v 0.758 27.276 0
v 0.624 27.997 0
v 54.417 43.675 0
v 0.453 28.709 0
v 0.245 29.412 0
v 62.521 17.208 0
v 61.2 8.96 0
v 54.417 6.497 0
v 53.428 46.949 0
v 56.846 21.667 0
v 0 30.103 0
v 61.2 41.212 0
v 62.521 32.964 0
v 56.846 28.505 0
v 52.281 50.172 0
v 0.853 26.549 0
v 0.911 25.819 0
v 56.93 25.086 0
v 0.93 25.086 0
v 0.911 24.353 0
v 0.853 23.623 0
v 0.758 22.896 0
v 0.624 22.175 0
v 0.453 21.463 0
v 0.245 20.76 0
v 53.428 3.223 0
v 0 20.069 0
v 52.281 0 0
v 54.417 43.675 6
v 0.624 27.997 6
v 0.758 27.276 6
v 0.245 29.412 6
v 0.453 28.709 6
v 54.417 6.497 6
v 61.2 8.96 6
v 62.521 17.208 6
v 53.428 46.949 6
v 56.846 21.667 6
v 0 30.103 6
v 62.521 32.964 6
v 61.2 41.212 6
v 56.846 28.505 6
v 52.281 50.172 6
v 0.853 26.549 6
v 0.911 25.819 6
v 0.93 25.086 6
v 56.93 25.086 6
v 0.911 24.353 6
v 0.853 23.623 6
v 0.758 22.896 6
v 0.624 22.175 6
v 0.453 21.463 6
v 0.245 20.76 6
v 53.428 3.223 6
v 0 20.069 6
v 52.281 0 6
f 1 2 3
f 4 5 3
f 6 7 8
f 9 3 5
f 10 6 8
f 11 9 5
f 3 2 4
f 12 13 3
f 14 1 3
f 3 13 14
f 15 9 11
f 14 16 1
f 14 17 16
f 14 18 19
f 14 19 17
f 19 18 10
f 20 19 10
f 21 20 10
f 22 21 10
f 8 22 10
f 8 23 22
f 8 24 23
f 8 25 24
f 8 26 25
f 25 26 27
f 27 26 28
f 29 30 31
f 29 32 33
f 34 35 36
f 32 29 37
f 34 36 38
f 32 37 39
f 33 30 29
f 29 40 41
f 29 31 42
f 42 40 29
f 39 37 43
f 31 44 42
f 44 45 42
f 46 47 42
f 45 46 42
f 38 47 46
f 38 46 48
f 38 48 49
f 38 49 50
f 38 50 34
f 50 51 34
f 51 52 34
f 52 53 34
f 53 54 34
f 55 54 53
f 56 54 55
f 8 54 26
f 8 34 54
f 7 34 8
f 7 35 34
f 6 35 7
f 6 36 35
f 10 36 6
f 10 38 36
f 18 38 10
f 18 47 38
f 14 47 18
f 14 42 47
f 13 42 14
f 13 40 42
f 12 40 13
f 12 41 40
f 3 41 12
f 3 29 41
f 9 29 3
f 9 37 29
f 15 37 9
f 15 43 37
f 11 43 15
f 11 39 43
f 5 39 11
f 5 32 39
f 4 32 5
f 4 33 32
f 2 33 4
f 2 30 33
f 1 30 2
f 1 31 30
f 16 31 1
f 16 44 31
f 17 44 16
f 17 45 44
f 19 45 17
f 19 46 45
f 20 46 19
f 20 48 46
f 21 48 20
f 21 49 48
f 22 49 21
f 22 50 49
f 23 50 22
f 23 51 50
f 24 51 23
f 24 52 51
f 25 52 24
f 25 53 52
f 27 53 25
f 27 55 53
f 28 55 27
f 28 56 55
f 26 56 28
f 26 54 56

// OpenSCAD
$fn = 32;

// ----------------------------------------------------------------------
// Gear sector: 2 teeth on 42 degrees
// ----------------------------------------------------------------------

// --- parameters (mm) ---
sector_angle = 42;        // sector angle, degrees
root_r = 70;              // root circle radius
tooth_h = 6;              // tooth height over the root circle
teeth = 2;                // number of teeth on the sector
hub_r = 14;               // hub bore radius
plate_t = 6;              // sector thickness, Z
arc_step = 3;             // sampling step of the root/hub arcs, degrees

tip_r = root_r + tooth_h;  // tip circle radius

profile = [[52.281, 0], [53.428, 3.223], [54.417, 6.497], [61.2, 8.96], [62.521, 17.208], [56.846, 21.667], [56.93, 25.086], [56.846, 28.505], [62.521, 32.964], [61.2, 41.212], [54.417, 43.675], [53.428, 46.949], [52.281, 50.172], [0, 30.103], [0.245, 29.412], [0.453, 28.709], [0.624, 27.997], [0.758, 27.276], [0.853, 26.549], [0.911, 25.819], [0.93, 25.086], [0.911, 24.353], [0.853, 23.623], [0.758, 22.896], [0.624, 22.175], [0.453, 21.463], [0.245, 20.76], [0, 20.069]];  // primary outline, 28 points, counter clockwise

// --- the one profile operation ---
linear_extrude(height = plate_t) polygon(points = profile);
